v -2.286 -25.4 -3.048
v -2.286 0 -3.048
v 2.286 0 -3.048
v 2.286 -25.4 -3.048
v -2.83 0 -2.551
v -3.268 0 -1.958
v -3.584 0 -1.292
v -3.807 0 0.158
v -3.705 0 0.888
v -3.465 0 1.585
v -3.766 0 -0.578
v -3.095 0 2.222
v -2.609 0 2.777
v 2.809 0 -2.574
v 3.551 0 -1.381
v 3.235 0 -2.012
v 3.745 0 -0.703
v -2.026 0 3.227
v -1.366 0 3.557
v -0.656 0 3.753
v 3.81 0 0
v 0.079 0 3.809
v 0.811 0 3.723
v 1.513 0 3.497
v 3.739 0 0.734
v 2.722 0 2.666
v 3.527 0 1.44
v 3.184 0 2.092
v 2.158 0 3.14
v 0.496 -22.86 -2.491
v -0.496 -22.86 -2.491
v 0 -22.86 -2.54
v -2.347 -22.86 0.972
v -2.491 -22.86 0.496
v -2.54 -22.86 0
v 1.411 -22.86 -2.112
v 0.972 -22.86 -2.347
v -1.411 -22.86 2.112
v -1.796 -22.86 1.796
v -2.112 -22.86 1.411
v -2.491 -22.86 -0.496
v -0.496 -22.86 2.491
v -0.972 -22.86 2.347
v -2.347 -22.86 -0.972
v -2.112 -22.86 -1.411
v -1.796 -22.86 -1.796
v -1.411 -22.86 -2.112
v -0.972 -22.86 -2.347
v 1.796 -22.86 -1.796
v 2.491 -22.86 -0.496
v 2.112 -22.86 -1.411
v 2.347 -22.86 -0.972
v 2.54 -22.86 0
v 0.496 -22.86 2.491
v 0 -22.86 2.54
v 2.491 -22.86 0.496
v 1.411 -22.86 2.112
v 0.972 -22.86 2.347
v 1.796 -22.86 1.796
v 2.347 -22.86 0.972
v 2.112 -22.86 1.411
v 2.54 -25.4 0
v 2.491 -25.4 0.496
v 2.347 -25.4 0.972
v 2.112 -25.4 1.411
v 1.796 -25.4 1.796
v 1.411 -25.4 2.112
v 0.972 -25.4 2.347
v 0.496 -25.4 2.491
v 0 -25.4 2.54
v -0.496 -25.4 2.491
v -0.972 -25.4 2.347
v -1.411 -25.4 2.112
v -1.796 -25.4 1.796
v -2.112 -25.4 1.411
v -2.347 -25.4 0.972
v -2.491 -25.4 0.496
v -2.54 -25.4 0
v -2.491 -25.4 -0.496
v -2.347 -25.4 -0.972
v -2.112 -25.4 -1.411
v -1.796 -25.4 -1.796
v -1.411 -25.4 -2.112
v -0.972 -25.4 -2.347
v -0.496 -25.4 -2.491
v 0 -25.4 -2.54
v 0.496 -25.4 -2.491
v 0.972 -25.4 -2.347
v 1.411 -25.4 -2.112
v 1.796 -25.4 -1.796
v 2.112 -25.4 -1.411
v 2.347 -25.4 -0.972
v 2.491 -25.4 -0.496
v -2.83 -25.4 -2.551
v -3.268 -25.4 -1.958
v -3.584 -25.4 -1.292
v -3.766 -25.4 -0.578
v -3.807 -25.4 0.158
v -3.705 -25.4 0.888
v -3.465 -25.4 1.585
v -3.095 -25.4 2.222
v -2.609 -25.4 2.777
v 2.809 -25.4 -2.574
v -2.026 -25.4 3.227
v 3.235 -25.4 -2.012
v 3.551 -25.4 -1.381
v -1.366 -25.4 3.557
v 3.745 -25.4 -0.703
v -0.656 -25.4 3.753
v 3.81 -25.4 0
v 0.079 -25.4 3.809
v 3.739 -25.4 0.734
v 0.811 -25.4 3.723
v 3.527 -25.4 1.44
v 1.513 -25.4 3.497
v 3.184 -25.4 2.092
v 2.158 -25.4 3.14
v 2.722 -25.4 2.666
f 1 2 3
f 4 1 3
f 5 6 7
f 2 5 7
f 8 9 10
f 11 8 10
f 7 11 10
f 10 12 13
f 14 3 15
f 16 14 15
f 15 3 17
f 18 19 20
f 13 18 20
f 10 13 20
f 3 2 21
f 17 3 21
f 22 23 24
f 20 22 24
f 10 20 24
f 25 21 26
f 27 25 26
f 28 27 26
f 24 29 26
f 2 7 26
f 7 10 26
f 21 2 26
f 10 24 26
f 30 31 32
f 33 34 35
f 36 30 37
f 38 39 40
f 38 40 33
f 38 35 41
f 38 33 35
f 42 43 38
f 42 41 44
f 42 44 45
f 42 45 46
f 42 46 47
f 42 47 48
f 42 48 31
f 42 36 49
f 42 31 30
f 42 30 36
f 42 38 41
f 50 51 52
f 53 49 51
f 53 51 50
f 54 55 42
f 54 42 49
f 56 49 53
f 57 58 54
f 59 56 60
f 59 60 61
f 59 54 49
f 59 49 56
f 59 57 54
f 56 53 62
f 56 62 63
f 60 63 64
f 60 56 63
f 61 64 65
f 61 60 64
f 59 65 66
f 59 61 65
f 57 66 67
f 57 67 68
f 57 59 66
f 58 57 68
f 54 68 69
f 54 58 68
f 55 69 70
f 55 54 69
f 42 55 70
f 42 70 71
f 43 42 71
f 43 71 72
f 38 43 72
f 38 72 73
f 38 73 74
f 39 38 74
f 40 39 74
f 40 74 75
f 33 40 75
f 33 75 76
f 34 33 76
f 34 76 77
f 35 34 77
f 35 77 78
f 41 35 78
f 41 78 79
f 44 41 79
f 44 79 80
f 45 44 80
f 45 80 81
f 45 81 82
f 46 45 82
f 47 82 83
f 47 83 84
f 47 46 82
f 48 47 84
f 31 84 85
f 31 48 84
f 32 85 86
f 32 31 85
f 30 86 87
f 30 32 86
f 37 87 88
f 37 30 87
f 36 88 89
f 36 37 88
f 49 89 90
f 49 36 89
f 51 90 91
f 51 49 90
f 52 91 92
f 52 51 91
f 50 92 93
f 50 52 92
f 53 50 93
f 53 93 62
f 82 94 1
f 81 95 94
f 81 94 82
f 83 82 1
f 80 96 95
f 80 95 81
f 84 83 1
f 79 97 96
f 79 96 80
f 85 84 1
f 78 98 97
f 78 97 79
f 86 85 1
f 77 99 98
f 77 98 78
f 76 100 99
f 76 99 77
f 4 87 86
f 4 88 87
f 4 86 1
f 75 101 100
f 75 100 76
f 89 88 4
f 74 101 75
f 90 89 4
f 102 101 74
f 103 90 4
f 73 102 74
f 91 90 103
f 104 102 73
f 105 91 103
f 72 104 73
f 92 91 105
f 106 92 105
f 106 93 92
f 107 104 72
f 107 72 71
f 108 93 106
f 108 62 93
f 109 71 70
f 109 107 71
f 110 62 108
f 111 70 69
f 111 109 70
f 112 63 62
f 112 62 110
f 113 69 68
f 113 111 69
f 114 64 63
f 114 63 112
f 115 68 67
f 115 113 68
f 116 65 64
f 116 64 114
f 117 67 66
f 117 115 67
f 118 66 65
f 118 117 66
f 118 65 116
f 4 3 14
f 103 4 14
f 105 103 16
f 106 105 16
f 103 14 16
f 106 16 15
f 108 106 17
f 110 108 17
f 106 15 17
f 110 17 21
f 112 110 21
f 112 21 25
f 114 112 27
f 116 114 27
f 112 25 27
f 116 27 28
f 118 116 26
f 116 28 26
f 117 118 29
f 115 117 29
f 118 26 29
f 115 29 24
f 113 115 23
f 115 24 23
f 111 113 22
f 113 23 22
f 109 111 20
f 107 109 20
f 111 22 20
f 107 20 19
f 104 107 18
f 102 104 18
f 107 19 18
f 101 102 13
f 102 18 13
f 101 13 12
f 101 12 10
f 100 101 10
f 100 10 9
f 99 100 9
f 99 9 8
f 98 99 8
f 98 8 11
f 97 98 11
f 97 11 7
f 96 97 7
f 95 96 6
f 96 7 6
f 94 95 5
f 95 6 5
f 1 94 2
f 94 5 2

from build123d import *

# Parameters (mm, degrees)
F0_R     = 2.54
F1_DEPTH = 25.4
F2_DEPTH = 22.86


with BuildPart() as f1:
    # F0 (on Front) → F1 (new body)
    with BuildSketch(Plane.XZ):
        with BuildLine():
            ThreePointArc((2.286, -3.048), (3.407768, -1.703884), (3.81, 0))
            ThreePointArc((3.81, 0), (-1.703884, 3.407768), (-2.286, -3.048))
            Line((-2.286, -3.048), (2.286, -3.048))
        make_face()
        Circle(F0_R, mode=Mode.SUBTRACT)
    extrude(amount=F1_DEPTH)

    # F0 (on Front) → F2 (join)
    with BuildSketch(Plane.XZ):
        Circle(F0_R)
    extrude(amount=F2_DEPTH)


solid = f1.part
